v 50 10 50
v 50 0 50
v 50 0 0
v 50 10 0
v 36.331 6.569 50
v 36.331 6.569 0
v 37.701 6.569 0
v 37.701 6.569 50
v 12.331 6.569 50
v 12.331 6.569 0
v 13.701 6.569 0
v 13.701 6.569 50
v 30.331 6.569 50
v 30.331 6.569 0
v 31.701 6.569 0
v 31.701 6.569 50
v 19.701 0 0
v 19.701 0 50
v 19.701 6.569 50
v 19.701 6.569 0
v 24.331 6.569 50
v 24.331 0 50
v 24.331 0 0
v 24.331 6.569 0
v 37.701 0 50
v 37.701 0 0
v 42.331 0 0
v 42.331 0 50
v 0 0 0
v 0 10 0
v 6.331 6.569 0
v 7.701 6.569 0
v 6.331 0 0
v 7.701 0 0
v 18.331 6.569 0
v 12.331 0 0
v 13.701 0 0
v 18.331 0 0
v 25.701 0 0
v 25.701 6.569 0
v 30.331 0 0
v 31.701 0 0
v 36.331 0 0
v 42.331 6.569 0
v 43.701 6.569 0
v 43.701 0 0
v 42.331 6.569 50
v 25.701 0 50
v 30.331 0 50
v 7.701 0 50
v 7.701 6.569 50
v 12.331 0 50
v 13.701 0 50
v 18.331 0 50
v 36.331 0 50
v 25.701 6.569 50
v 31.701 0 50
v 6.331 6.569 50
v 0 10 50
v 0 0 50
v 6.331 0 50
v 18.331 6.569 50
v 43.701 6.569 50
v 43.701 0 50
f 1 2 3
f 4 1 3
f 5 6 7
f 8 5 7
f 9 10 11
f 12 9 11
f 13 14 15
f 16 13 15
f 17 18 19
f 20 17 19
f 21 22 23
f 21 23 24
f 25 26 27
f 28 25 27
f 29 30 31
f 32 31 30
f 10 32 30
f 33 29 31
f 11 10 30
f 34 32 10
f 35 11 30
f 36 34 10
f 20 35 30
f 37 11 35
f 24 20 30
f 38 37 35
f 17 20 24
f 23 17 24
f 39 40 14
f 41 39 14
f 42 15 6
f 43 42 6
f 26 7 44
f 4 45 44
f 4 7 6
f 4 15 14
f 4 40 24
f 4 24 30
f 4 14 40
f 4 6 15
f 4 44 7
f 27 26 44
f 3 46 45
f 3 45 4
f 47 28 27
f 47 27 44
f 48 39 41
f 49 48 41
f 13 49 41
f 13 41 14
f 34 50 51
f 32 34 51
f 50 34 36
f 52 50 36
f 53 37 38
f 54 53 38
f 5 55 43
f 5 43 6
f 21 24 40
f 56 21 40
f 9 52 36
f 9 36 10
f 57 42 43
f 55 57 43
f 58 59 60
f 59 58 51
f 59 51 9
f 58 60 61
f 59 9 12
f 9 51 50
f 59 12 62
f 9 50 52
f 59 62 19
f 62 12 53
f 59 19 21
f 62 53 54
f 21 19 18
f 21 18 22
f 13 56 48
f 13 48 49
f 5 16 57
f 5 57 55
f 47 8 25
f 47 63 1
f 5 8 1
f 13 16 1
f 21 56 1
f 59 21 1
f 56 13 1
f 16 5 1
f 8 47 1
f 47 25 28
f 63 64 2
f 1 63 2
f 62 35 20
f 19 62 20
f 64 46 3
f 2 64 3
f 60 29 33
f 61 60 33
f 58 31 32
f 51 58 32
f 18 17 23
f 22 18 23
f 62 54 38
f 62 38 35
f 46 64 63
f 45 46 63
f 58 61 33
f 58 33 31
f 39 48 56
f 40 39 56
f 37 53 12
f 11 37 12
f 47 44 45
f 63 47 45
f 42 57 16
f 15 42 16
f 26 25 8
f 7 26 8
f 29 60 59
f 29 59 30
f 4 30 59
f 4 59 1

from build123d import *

# Parameters (mm, degrees)
SKETCH1_W           = 50
SKETCH1_H           = 50
BOSS_EXTRUDE1_DEPTH = 10
SKETCH3_W           = 1.37
SKETCH3_H           = 6.568764243
CUT_EXTRUDE1_DEPTH  = 50
LPATTERN1_COUNT     = 7
LPATTERN1_PITCH     = 6


with BuildPart() as part:
    # Sketch1 → Boss-Extrude1 (new body)
    with BuildSketch(Plane(origin=(0, 0, 0), x_dir=(1, 0, 0), z_dir=(0, 1, 0))):
        with Locations((25, -25)):
            Rectangle(SKETCH1_W, SKETCH1_H)
    extrude(amount=BOSS_EXTRUDE1_DEPTH)

    # Sketch3 → Cut-Extrude1 (cut)
    with BuildSketch(Plane.XY.offset(50)):
        with Locations((7.015961915, 3.284382122)):
            Rectangle(SKETCH3_W, SKETCH3_H)
    cut_extrude1 = extrude(amount=-CUT_EXTRUDE1_DEPTH, mode=Mode.SUBTRACT)

    # LPattern1: Cut-Extrude1 ×7
    with Locations(*[(i * LPATTERN1_PITCH, 0, 0) for i in range(1, LPATTERN1_COUNT)]):
        add(cut_extrude1, mode=Mode.SUBTRACT)


solid = part.part
